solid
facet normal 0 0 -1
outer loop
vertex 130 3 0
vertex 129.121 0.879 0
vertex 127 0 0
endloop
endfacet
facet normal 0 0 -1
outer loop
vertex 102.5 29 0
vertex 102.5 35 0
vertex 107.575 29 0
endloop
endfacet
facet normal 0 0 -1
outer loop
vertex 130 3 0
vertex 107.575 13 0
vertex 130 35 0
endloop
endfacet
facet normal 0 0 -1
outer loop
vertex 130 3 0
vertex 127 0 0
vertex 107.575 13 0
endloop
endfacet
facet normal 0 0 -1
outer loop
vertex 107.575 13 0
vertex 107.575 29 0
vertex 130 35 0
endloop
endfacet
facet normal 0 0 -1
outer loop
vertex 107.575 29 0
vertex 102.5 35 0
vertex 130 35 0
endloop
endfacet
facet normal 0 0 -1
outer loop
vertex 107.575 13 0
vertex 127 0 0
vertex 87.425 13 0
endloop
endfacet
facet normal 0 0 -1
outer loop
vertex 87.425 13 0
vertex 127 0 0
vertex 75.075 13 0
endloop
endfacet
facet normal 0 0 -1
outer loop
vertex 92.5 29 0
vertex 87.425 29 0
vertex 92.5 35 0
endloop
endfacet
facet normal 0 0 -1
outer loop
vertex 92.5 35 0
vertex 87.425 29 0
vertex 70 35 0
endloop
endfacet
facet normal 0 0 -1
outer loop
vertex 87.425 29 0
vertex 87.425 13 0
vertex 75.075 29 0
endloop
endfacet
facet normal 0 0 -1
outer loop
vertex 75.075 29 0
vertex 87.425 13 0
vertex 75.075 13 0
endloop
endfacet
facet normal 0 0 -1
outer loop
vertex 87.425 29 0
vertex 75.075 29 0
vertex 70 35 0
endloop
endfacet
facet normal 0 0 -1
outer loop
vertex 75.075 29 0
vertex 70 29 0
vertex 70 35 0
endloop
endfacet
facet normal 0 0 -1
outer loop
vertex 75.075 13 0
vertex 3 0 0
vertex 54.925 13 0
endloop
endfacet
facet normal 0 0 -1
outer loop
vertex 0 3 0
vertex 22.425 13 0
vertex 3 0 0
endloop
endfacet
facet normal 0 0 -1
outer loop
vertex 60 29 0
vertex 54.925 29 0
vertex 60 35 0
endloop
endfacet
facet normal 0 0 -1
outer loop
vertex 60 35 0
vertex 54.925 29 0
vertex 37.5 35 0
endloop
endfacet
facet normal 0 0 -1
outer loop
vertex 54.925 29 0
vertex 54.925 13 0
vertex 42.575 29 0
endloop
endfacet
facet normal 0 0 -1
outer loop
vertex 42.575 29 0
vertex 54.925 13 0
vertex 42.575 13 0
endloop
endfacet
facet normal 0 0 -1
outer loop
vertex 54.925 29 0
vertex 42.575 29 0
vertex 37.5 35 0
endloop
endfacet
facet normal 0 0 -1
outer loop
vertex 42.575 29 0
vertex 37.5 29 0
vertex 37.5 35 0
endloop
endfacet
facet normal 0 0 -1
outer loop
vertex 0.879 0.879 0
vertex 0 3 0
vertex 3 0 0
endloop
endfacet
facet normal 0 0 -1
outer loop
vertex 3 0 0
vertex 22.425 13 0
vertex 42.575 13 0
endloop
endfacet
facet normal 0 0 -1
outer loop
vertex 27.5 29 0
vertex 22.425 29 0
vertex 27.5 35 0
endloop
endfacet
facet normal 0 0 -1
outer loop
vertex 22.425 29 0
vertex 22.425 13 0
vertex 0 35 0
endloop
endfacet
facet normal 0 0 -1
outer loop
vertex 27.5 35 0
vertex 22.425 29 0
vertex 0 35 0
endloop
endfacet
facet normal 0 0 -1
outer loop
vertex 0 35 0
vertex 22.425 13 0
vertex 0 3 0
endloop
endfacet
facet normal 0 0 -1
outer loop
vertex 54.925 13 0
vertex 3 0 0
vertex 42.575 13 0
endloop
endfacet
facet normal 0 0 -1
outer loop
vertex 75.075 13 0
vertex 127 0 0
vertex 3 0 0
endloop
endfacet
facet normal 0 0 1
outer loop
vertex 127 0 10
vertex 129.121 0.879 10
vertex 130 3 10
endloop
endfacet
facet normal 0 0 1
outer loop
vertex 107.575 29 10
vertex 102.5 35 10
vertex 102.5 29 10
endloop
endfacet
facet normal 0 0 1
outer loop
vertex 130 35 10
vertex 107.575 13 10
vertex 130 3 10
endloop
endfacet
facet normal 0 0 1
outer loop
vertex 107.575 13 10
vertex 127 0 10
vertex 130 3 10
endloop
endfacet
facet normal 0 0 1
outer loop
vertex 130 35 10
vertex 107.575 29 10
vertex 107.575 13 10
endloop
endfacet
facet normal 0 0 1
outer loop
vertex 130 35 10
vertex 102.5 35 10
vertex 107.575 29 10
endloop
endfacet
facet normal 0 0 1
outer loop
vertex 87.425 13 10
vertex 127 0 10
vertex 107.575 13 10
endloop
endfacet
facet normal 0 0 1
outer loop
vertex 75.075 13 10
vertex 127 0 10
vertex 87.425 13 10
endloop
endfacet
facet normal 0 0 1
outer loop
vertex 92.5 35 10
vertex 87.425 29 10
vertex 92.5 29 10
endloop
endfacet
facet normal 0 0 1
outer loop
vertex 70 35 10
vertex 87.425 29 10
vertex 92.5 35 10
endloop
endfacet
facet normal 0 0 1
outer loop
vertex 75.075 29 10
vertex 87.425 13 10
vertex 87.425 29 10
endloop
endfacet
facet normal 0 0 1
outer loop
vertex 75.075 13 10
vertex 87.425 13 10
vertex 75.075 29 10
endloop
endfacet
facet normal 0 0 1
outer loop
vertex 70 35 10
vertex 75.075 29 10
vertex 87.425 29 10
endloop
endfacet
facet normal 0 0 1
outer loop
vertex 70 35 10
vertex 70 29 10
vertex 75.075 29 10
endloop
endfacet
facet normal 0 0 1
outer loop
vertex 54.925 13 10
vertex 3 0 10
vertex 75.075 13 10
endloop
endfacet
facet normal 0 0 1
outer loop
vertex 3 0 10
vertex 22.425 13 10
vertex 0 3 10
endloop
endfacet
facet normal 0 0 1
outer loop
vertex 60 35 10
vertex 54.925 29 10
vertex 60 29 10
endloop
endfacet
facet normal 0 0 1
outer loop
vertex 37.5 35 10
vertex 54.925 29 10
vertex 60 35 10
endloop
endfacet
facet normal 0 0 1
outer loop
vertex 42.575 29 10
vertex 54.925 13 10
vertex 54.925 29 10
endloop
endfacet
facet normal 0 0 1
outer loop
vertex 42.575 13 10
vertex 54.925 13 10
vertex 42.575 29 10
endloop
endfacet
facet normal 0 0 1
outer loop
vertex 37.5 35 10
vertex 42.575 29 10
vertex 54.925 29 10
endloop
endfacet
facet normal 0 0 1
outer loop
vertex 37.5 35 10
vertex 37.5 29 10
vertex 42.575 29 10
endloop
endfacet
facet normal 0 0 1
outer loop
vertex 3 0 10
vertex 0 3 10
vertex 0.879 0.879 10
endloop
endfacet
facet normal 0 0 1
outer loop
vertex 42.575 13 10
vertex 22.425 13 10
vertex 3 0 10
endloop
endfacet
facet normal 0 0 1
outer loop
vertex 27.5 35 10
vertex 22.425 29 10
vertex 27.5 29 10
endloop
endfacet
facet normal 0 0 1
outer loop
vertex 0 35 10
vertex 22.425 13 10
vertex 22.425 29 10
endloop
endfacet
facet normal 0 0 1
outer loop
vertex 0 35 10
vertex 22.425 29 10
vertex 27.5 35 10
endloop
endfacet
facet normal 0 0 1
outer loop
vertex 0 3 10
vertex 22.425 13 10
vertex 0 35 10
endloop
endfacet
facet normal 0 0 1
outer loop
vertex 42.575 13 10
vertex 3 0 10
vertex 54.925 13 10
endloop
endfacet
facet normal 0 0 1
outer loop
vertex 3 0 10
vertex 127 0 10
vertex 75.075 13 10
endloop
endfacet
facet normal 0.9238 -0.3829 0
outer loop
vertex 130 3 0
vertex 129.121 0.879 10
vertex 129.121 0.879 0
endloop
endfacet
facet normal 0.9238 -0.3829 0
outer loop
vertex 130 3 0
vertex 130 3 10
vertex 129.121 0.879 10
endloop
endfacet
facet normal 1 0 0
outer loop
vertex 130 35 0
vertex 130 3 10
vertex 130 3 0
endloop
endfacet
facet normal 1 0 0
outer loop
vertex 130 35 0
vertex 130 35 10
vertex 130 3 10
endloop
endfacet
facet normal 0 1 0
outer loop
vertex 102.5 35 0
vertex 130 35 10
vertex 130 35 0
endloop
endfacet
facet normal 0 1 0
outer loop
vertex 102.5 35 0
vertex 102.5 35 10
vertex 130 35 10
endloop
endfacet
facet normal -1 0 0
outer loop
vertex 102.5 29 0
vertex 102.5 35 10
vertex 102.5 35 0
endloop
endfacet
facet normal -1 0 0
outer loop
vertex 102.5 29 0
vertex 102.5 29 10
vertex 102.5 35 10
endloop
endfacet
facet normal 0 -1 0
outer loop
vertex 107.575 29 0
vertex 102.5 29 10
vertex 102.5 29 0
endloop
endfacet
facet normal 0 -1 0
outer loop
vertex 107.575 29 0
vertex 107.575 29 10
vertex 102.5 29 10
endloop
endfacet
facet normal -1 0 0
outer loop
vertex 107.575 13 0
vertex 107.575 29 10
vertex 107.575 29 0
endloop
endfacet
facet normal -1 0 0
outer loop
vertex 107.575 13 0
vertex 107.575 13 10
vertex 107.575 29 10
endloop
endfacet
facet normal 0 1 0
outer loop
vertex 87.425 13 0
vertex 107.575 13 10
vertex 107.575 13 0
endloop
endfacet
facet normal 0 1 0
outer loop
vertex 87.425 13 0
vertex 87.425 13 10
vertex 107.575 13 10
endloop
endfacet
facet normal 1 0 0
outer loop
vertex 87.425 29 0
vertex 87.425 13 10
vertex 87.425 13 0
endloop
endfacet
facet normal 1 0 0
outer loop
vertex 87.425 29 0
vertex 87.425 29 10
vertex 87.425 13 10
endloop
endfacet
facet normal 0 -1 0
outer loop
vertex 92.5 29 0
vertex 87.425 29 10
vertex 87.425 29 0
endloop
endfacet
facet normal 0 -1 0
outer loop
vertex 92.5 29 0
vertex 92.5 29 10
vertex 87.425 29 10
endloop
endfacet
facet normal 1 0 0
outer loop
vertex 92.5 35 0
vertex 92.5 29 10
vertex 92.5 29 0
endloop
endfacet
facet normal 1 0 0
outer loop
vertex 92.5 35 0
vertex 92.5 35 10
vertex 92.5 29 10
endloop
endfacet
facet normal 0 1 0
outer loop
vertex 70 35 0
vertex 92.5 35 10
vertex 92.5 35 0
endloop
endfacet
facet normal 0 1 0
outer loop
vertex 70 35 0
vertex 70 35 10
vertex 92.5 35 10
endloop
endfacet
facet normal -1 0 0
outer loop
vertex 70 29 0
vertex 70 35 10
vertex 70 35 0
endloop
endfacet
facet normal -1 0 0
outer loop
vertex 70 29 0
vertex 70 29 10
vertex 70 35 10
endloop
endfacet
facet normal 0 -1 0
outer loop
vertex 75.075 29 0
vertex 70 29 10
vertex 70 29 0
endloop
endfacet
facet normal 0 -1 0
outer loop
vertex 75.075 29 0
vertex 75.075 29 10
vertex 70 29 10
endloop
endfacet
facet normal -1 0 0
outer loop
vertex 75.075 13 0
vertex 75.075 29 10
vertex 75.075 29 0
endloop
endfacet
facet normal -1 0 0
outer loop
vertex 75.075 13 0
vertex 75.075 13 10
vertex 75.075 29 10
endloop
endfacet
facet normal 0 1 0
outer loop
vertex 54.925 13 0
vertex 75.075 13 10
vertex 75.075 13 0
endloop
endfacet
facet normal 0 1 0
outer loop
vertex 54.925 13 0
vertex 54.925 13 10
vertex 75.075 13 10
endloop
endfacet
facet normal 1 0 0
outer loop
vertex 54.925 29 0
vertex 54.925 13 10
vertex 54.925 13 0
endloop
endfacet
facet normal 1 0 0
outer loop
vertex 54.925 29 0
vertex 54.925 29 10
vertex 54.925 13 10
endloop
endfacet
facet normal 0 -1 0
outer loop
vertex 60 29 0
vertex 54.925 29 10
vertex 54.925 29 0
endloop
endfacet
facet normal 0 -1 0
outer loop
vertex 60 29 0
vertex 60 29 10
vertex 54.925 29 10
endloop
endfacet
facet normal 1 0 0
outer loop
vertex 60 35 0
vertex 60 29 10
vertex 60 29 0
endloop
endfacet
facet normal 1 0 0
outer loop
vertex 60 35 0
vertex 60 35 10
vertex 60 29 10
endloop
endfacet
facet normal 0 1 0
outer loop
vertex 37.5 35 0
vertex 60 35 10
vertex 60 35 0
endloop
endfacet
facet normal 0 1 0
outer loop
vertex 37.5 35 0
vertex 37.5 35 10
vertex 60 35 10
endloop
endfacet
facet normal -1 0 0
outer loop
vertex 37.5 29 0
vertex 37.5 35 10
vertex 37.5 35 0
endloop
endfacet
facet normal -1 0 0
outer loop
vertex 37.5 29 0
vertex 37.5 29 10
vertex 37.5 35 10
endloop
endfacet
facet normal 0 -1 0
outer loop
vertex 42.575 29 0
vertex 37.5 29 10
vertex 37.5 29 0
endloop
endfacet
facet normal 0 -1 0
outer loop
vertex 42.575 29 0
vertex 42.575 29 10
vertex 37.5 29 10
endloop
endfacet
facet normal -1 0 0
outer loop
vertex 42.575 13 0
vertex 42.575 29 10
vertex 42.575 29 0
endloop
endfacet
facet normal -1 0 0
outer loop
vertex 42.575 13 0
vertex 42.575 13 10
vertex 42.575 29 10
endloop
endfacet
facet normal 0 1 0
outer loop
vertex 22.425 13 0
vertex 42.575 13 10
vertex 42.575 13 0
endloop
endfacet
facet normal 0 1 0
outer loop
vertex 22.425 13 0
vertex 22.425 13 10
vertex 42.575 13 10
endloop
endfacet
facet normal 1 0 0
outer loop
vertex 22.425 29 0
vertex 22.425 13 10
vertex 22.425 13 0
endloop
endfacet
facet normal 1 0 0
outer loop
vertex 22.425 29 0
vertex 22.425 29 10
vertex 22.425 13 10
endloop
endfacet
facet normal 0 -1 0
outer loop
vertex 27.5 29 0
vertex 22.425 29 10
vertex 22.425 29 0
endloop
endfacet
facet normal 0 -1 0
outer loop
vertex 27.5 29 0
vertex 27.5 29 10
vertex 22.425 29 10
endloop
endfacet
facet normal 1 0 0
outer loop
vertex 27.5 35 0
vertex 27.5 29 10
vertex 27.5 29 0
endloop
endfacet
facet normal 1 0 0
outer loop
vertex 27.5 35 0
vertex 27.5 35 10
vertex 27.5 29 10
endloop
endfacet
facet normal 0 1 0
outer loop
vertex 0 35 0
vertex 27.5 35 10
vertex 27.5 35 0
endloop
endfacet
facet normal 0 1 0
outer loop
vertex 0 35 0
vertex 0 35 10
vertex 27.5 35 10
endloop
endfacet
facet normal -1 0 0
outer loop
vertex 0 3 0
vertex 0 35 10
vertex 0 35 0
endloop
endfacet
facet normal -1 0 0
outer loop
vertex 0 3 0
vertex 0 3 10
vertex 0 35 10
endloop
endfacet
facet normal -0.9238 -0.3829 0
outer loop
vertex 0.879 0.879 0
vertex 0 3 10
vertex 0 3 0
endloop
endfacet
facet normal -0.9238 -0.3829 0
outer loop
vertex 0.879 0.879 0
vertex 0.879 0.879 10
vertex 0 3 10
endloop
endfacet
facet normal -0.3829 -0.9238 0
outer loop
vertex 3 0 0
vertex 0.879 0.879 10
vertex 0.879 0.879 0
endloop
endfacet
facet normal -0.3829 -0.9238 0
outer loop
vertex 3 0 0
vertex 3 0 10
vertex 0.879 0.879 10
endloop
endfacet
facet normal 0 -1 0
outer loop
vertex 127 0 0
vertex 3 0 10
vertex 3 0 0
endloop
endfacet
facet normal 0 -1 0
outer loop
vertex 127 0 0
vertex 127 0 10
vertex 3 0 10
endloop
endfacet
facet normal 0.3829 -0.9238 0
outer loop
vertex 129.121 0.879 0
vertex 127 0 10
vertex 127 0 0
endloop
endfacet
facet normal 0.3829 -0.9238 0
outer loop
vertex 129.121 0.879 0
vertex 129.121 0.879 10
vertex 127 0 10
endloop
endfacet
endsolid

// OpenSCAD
$fn = 32;

// ----------------------------------------------------------------------
// Window plate: 130 x 35 mm, 3 open windows
// ----------------------------------------------------------------------

// --- parameters (mm) ---
profile_height = 10;      // extrusion height
profile_points = 32;      // points of the closed outline

profile = [[0, 3], [0.879, 0.879], [3, 0], [127, 0], [129.121, 0.879], [130, 3], [130, 35], [102.5, 35], [102.5, 29], [107.575, 29], [107.575, 13], [87.425, 13], [87.425, 29], [92.5, 29], [92.5, 35], [70, 35], [70, 29], [75.075, 29], [75.075, 13], [54.925, 13], [54.925, 29], [60, 29], [60, 35], [37.5, 35], [37.5, 29], [42.575, 29], [42.575, 13], [22.425, 13], [22.425, 29], [27.5, 29], [27.5, 35], [0, 35]];  // single closed polygon, 32 points, counter clockwise

// --- the one profile operation ---
linear_extrude(height = profile_height) polygon(points = profile);
